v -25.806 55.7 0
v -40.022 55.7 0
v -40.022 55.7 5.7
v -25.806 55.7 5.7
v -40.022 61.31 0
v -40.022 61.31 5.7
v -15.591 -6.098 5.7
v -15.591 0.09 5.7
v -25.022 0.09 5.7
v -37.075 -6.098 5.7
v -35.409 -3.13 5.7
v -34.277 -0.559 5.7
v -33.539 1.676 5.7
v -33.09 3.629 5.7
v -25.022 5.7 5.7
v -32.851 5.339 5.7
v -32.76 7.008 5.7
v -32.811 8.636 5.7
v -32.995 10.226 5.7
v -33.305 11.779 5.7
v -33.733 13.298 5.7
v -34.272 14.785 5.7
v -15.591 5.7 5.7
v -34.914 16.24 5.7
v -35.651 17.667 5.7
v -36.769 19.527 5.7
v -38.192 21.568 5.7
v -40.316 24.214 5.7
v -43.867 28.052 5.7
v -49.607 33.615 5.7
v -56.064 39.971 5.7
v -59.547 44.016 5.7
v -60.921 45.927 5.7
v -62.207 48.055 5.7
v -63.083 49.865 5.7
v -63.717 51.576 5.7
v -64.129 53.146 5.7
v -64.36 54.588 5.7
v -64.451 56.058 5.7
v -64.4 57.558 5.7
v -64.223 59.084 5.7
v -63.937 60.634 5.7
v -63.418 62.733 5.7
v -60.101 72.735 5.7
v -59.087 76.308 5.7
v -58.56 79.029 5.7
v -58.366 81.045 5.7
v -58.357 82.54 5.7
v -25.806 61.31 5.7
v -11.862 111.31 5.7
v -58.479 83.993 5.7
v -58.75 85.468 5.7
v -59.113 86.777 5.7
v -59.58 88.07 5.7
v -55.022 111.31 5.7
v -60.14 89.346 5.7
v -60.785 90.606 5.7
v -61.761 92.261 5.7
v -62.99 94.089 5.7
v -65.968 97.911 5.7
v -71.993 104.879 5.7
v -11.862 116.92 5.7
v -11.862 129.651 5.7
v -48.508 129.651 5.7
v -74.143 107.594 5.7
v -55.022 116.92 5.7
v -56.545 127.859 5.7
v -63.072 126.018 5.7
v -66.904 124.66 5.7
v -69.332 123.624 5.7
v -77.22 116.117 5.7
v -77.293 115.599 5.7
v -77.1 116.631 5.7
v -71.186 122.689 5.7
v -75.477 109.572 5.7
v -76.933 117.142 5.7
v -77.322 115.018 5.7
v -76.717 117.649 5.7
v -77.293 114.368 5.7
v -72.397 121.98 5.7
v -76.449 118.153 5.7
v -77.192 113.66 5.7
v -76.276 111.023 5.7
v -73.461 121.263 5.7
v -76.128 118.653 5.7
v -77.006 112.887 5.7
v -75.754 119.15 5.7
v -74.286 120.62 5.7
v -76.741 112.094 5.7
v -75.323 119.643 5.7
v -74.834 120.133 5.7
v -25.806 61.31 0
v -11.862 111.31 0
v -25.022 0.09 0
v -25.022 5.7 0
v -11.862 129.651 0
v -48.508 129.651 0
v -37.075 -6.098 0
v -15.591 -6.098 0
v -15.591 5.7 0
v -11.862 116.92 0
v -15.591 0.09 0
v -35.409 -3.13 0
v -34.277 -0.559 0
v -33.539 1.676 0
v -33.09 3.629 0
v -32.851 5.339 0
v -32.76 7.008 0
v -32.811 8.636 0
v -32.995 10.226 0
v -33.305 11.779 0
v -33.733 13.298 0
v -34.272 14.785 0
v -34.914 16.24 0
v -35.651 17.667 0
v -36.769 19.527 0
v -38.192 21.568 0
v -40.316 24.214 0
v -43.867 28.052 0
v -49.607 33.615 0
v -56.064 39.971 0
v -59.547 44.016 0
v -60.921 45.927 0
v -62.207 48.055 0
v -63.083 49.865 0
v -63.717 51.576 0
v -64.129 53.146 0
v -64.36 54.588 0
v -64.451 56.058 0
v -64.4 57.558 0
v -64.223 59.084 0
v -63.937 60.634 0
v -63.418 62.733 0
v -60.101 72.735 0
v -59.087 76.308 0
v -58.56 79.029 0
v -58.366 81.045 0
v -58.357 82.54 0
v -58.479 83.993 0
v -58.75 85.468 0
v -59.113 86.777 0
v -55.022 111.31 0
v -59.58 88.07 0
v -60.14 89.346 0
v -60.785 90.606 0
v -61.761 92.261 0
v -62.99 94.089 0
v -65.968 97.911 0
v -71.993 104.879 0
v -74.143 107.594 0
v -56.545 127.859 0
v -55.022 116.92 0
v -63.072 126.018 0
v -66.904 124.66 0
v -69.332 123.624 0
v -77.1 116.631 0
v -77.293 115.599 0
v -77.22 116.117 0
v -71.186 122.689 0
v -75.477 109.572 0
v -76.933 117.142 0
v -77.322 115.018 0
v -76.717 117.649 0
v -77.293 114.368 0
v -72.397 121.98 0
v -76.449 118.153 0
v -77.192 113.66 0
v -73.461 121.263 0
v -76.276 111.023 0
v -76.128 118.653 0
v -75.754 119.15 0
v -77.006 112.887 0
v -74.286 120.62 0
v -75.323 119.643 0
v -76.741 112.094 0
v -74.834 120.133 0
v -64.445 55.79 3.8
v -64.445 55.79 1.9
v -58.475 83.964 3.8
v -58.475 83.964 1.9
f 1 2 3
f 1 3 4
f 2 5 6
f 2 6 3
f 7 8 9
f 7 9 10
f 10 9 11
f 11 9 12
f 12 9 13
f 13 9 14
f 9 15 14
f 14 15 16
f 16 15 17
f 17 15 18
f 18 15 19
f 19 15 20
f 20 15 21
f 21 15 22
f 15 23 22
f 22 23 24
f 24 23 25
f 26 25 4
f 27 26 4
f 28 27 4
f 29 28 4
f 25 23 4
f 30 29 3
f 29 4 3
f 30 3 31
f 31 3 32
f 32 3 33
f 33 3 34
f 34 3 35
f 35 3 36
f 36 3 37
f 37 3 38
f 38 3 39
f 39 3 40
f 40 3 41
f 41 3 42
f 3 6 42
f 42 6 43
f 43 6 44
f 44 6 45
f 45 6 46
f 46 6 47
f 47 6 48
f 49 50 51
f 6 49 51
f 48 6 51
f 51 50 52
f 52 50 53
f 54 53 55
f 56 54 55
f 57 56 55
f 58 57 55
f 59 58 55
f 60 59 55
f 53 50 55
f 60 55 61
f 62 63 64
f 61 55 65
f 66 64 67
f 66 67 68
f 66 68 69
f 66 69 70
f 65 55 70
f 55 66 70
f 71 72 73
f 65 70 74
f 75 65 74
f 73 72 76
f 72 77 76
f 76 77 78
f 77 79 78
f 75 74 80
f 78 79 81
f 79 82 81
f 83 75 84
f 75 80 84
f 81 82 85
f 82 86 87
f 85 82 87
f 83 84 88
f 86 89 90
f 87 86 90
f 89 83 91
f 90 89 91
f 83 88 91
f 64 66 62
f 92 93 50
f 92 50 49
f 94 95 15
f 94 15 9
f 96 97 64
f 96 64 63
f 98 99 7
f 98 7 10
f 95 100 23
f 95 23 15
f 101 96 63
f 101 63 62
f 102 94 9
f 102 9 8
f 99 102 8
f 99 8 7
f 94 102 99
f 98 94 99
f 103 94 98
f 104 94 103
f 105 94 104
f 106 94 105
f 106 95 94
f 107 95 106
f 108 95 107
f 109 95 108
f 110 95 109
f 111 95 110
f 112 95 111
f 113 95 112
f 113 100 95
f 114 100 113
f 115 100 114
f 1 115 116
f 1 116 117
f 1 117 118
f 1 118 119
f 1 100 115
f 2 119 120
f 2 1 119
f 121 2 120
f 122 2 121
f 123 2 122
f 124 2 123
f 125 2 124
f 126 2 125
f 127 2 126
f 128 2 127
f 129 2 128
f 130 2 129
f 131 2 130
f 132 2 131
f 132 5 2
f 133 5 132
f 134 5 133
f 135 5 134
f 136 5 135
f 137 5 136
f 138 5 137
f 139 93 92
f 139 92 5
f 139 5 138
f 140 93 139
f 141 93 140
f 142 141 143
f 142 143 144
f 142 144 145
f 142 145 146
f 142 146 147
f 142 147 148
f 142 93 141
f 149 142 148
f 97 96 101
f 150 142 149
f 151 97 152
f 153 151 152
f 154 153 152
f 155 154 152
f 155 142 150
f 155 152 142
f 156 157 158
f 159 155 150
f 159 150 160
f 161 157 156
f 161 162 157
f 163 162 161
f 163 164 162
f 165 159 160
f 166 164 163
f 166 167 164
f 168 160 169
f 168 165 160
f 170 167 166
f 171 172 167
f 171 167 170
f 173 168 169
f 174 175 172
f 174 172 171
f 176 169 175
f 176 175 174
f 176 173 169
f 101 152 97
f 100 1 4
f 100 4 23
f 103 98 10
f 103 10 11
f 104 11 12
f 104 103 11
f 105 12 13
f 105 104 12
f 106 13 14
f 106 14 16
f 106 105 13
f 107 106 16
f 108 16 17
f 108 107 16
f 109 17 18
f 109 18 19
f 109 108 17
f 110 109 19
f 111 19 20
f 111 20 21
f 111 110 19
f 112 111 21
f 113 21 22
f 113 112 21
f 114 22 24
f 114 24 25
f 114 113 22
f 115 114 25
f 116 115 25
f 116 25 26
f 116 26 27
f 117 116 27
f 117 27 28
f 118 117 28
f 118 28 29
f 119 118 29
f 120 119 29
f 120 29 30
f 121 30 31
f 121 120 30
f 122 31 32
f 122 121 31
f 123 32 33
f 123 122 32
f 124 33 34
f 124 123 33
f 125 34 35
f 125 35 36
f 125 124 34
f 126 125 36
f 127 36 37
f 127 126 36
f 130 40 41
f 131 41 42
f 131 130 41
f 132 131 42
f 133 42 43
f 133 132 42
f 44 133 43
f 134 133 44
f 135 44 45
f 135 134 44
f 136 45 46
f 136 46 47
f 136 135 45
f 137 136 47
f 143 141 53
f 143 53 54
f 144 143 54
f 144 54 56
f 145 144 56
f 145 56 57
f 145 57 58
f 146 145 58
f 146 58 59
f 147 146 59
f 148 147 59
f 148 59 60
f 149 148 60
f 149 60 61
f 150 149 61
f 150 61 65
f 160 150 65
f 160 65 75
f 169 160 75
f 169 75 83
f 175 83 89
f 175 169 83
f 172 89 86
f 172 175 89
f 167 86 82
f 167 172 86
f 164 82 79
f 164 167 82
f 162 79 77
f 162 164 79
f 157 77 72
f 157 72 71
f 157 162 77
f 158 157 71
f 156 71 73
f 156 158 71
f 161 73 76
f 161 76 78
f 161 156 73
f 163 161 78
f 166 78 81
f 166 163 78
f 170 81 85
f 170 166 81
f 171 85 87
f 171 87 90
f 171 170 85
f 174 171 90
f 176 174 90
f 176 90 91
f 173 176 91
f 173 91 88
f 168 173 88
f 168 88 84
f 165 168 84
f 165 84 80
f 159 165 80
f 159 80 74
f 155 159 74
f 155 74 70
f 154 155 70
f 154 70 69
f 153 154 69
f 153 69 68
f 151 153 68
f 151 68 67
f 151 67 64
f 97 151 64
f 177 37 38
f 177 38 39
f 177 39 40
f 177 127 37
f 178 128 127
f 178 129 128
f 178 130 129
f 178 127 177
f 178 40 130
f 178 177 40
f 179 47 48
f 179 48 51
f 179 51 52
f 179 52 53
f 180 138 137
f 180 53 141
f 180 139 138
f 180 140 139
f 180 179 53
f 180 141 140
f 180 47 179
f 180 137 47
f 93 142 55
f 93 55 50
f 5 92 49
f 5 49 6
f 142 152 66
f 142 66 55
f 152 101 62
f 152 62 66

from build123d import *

# Parameters (mm, degrees)
ESTRUSIONE_ESTRUSIONE1_DEPTH = 5.7


with BuildPart() as part:
    # Model → Estrusione-Estrusione1 (new body)
    with BuildSketch(Plane.XY):
        with BuildLine():
            Line((-15.590957203, -6.098313674), (-37.075171155, -6.098313674))
            add(Edge.make_bspline(
                [(-37.075171155, -6.098313674), (-18.932670585, 22.997594141), (-82.522630452, 39.780268479), (-40.971539706, 97.496941546), (-105.285323281, 118.285278382), (-48.507865771, 129.650537837)],
                knots=[0, 0, 0, 0, 0.42870662, 0.607446095, 1, 1, 1, 1], degree=3))
            Line((-48.507865771, 129.650537837), (-11.862077277, 129.650537837))
            Line((-11.862077277, 129.650537837), (-11.862077277, 116.92))
            Line((-11.862077277, 116.92), (-55.0225, 116.92))
            Line((-55.0225, 116.92), (-55.0225, 111.31))
            Line((-55.0225, 111.31), (-11.862077277, 111.31))
            Line((-11.862077277, 111.31), (-25.805722267, 61.31))
            Line((-25.805722267, 61.31), (-40.0225, 61.31))
            Line((-40.0225, 61.31), (-40.0225, 55.7))
            Line((-40.0225, 55.7), (-25.805722267, 55.7))
            Line((-25.805722267, 55.7), (-15.590957203, 5.7))
            Line((-15.590957203, 5.7), (-25.0225, 5.7))
            Line((-25.0225, 5.7), (-25.0225, 0.09))
            Line((-25.0225, 0.09), (-15.590957203, 0.09))
            Line((-15.590957203, 0.09), (-15.590957203, -6.098313674))
        make_face()
    extrude(amount=ESTRUSIONE_ESTRUSIONE1_DEPTH)


solid = part.part
